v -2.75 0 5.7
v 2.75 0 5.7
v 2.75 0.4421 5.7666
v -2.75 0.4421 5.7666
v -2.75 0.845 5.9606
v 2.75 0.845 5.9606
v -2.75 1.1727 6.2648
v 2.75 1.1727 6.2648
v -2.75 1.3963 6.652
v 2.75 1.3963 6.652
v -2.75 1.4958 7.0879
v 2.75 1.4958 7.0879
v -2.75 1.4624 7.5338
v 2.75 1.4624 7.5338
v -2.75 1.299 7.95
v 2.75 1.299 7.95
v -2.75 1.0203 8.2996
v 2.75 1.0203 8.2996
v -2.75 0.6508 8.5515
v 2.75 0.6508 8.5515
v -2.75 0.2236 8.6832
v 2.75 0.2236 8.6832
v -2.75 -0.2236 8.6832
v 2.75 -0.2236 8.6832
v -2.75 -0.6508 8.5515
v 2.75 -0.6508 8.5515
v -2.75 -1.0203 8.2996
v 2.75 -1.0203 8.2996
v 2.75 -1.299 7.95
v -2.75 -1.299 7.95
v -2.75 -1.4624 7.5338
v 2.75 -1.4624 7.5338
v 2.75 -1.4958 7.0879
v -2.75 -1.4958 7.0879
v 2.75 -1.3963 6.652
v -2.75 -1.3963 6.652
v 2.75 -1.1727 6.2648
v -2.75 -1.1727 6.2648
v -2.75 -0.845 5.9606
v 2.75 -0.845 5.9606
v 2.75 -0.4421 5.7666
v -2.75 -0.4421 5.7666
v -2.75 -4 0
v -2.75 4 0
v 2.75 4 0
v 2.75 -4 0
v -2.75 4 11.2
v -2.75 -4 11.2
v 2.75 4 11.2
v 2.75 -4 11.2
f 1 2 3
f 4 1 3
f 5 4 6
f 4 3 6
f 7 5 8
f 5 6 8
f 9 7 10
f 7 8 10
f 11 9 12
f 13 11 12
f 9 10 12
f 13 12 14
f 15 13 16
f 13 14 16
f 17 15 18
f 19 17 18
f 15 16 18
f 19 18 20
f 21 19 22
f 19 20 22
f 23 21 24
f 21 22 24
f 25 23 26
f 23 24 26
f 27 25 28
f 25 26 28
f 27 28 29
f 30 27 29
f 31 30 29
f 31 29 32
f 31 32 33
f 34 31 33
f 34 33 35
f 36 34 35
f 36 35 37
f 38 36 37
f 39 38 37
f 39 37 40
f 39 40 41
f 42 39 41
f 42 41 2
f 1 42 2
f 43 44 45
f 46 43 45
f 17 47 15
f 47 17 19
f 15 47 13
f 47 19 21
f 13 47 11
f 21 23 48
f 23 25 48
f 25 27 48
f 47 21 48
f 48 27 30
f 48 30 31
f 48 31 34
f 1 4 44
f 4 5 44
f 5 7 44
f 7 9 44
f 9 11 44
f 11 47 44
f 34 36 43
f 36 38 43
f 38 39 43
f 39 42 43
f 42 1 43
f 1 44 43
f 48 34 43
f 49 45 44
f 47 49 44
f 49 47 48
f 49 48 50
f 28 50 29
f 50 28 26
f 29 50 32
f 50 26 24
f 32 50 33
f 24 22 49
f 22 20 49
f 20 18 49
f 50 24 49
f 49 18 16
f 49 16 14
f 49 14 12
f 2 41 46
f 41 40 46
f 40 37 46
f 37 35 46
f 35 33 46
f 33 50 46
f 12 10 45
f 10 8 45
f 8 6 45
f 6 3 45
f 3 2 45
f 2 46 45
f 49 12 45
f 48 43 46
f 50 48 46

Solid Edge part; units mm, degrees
sketch "Sketch1" plane through (0, 0, 0) normal (0, 0, 1) x (1, 0, 0)
  line L0 (2.75, -4) -> (2.75, 4)
  line L1 (2.75, 4) -> (-2.75, 4)
  line L2 (-2.75, 4) -> (-2.75, -4)
  line L3 (-2.75, -4) -> (2.75, -4)
extrude "Protrusion1" add sketch "Sketch1" along normal blind 11.2
hole "Hole_1" at (2.75, 0, 7.2) direction (-1, 0, 0) diameter 3 end up to next
